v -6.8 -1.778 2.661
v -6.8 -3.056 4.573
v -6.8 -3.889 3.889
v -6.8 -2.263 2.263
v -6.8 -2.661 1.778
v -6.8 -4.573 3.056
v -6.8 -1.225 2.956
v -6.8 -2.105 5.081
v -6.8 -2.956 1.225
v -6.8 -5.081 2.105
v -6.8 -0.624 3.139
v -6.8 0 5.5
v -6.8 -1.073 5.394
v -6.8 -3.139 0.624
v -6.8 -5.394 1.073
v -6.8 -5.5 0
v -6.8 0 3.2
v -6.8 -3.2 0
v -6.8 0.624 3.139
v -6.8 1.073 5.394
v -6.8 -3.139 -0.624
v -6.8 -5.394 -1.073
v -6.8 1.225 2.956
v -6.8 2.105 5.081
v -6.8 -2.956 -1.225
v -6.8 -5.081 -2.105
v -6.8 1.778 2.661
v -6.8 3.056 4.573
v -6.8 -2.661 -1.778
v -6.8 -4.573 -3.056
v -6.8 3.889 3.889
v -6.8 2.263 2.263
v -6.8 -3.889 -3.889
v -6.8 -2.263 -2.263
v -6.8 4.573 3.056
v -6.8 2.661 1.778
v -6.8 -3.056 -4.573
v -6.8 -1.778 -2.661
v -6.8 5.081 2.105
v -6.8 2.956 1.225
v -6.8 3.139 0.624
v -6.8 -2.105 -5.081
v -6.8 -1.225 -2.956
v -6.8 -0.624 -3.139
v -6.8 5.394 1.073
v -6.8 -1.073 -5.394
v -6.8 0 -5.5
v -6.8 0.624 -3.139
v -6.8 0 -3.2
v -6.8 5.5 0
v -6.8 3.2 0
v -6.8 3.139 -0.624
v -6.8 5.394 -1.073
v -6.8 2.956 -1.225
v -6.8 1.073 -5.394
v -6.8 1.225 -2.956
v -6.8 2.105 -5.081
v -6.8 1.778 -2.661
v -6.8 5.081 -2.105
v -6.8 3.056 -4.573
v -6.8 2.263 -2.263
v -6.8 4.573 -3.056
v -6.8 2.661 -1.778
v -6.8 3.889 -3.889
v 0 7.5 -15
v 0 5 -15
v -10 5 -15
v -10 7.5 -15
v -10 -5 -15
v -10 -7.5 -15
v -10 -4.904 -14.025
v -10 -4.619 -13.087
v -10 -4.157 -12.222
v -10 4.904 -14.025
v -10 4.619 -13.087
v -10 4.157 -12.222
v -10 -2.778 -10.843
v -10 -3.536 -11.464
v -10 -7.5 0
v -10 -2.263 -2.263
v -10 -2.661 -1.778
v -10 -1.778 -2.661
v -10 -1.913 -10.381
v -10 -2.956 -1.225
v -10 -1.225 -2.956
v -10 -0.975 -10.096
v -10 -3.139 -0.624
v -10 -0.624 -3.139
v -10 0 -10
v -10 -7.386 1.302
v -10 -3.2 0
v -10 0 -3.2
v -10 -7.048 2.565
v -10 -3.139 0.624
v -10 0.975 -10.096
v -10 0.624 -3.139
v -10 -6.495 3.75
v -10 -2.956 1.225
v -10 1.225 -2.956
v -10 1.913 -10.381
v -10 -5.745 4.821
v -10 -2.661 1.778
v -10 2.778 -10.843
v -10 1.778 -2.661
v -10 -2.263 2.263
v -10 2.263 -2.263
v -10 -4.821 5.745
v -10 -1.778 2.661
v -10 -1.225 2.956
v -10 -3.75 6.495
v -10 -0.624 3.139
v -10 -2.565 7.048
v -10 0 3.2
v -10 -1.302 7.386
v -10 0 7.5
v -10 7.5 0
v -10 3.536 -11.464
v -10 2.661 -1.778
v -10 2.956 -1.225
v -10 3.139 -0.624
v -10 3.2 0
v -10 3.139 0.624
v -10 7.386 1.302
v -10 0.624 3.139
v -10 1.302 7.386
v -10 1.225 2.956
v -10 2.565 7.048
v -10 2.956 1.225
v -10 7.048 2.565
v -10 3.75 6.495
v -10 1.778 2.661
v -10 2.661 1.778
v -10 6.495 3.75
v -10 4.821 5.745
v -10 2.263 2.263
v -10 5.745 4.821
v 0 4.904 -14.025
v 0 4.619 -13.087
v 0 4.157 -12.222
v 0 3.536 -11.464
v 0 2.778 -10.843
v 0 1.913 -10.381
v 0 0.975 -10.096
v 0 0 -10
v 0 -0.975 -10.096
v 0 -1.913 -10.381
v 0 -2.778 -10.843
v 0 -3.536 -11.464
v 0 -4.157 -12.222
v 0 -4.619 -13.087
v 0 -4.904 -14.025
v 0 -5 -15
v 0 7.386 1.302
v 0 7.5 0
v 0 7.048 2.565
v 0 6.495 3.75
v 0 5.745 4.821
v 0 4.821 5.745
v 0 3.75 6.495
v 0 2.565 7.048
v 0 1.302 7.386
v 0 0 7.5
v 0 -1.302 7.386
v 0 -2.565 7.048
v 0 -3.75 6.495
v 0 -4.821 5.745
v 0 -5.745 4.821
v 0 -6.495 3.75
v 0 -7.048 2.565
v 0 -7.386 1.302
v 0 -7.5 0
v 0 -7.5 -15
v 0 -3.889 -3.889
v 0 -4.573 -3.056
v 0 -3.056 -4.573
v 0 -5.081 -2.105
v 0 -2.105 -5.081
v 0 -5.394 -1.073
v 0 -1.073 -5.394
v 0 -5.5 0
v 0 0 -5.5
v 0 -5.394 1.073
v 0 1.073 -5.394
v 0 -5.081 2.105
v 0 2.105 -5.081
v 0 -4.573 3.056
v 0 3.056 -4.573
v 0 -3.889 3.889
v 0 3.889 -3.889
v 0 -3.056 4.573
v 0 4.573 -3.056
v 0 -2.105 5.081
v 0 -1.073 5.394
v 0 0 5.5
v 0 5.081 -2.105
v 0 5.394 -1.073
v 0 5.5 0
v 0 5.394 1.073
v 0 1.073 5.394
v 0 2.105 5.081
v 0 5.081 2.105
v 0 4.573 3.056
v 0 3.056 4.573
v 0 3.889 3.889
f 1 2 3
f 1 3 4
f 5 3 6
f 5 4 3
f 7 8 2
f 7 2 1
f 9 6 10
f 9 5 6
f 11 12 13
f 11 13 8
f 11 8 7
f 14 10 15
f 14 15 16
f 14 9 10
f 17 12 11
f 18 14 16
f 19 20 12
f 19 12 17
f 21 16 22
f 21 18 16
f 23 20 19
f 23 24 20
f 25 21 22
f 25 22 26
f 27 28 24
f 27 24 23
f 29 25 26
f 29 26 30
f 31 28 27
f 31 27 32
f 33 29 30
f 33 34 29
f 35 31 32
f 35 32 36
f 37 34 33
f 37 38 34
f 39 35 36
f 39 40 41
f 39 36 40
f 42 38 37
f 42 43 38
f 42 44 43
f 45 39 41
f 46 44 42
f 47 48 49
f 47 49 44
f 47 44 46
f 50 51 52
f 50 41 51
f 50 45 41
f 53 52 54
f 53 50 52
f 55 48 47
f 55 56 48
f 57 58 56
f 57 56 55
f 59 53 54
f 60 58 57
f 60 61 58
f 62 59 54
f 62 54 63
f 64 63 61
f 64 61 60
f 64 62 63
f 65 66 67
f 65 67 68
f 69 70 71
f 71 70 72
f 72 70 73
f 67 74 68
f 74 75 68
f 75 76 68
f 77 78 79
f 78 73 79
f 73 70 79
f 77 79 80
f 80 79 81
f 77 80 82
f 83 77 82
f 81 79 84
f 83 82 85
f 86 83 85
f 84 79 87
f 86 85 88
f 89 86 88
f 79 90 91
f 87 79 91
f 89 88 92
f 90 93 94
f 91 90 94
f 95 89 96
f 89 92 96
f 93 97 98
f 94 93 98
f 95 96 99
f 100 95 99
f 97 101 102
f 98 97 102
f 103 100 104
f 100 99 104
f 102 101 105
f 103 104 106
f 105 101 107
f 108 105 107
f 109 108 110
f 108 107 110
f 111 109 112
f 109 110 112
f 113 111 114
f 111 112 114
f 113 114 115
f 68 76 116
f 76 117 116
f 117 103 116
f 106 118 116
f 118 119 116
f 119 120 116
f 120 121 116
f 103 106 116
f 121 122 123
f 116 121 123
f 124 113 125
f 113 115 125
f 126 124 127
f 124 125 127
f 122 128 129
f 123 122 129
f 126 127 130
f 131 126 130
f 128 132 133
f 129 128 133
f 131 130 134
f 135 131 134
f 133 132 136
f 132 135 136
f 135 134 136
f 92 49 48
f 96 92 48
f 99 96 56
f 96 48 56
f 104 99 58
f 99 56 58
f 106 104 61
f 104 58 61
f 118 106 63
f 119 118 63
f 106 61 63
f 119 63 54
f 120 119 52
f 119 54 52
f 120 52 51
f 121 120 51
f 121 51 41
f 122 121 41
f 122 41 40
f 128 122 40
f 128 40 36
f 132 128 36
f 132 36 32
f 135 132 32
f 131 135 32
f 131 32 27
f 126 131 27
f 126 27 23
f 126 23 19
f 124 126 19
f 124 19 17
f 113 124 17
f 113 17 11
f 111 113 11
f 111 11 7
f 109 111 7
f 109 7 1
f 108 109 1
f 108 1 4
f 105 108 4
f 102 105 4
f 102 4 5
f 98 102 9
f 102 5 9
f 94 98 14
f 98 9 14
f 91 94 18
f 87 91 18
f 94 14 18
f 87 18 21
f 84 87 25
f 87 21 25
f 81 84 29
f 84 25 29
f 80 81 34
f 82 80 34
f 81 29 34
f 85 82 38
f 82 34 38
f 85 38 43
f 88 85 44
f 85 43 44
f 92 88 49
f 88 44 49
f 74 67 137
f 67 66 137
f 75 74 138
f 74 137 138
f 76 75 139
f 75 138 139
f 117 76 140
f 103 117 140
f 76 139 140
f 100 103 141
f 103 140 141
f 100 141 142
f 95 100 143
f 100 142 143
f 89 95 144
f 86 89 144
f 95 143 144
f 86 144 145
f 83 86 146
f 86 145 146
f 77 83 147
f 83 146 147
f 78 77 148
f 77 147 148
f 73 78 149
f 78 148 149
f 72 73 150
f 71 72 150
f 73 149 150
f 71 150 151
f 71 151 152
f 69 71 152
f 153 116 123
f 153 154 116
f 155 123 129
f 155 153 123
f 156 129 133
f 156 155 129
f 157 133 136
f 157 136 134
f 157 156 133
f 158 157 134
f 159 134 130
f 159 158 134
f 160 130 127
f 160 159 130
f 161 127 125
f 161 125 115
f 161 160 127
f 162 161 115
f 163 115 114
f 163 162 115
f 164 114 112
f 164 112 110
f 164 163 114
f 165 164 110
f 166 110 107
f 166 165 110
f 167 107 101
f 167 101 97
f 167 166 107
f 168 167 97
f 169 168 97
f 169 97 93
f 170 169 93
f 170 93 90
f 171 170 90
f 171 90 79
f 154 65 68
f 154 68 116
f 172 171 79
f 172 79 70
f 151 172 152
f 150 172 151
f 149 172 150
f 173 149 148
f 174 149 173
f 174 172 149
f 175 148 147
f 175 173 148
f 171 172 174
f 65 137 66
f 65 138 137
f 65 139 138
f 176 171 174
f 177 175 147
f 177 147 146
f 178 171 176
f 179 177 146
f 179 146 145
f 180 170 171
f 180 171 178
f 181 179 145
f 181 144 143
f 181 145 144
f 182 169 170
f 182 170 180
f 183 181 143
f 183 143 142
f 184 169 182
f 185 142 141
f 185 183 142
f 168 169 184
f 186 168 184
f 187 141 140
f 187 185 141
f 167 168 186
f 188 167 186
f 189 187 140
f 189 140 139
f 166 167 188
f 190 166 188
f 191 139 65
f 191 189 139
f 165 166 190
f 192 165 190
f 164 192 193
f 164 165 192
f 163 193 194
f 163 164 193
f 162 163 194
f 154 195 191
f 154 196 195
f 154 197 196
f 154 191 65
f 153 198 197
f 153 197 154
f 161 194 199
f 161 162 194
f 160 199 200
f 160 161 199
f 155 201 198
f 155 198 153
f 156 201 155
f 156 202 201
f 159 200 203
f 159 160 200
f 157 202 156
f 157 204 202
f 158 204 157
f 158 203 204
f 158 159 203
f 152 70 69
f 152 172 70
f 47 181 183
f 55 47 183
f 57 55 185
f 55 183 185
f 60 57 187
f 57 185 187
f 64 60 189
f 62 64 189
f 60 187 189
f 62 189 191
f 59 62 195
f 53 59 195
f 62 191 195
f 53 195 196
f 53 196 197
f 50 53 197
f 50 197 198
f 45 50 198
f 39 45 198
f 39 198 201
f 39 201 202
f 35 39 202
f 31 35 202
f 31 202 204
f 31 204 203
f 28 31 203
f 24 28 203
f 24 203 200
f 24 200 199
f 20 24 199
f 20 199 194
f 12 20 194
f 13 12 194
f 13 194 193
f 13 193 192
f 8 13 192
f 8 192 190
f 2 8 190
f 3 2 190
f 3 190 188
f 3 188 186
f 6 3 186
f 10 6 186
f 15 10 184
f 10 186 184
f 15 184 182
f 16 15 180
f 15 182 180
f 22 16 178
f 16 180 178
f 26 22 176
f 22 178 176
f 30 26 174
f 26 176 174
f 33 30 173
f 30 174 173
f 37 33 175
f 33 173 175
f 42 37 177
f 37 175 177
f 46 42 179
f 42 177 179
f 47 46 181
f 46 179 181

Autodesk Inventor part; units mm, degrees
ref_plane "YZ Plane" through (0, 0, 0) normal (1, 0, 0) x (0, 1, 0)
ref_plane "XZ Plane" through (0, 0, 0) normal (0, 1, 0) x (-1, 0, 0)
ref_plane "XY Plane" through (0, 0, 0) normal (0, 0, 1) x (1, 0, 0)
sketch "Sketch1" plane through (0, 0, 0) normal (1, 0, 0) x (0, 1, 0)
  line L0 (0, 0) -> (0, -30) construction
  line L1 (-7.5, 0) -> (-7.5, -30)
  line L2 (7.5, -30) -> (7.5, 0)
  arc A0 (7.5, 0) -> (-7.5, 0) centre (0, 0) ccw
  arc A1 (-7.5, -30) -> (7.5, -30) centre (0, -30) ccw
  point P0 (0, -15)
  dimension "d0" = 7.5
  dimension "d1" = 30
extrude "Extrusion1" add sketch "Sketch1" against normal blind 10
sketch "Sketch2" plane through (0, 0, 0) normal (1, 0, 0) x (0, 0, -1)
  line L0 (37.5, -7.5) -> (15, -7.5)
  line L1 (15, -7.5) -> (15, 7.5)
  line L2 (15, 7.5) -> (37.5, 7.5)
  line L3 (37.5, 7.5) -> (37.5, -7.5)
  arc A0 (30, -7.5) -> (30, 7.5) centre (30, 0) ccw projected
  line L4 (0, -7.5) -> (30, -7.5) projected
  line L5 (30, 7.5) -> (0, 7.5) projected
  point P0 (0, 0)
  point P1 (37.5, 0)
  point P2 (26.25, -7.5)
  point P3 (26.25, 7.5)
  point P4 (30, 7.5)
  point P5 (30, -7.5)
  dimension "d4" = 22.5
extrude "Extrusion2" cut sketch "Sketch2" against normal blind 10 contours L0 L1 L2 A0
sketch "Sketch3" plane through (0, 0, 0) normal (1, 0, 0) x (0, 0, -1)
  circle A0 centre (0, 0) radius 3.2
  line L0 (15, -7.5) -> (15, 7.5) projected
  point P0 (0, 0)
  dimension "d7" = 6.4
  dimension "d17" = 15
  dimension "d18" = 16.7705
extrude "Extrusion3" cut sketch "Sketch3" against normal blind 10
sketch "Sketch4" plane through (0, 0, 0) normal (1, 0, 0) x (0, 0, -1)
  circle A0 centre (0, 0) radius 5.5
  dimension "d11" = 11
extrude "Extrusion4" cut sketch "Sketch4" against normal blind 6.8
sketch "Sketch5" plane through (0, 0, 0) normal (1, 0, 0) x (0, 0, -1)
  line L0 (15, -7.5) -> (15, 7.5) projected
  circle A0 centre (15, 0) radius 5
  point P0 (0, 0)
  point P1 (15, 5)
  point P2 (15, -5)
  dimension "d14" = 10
extrude "Extrusion5" cut sketch "Sketch5" against normal through all contours A0 L0 picked at (13.3455, -0.2009)
